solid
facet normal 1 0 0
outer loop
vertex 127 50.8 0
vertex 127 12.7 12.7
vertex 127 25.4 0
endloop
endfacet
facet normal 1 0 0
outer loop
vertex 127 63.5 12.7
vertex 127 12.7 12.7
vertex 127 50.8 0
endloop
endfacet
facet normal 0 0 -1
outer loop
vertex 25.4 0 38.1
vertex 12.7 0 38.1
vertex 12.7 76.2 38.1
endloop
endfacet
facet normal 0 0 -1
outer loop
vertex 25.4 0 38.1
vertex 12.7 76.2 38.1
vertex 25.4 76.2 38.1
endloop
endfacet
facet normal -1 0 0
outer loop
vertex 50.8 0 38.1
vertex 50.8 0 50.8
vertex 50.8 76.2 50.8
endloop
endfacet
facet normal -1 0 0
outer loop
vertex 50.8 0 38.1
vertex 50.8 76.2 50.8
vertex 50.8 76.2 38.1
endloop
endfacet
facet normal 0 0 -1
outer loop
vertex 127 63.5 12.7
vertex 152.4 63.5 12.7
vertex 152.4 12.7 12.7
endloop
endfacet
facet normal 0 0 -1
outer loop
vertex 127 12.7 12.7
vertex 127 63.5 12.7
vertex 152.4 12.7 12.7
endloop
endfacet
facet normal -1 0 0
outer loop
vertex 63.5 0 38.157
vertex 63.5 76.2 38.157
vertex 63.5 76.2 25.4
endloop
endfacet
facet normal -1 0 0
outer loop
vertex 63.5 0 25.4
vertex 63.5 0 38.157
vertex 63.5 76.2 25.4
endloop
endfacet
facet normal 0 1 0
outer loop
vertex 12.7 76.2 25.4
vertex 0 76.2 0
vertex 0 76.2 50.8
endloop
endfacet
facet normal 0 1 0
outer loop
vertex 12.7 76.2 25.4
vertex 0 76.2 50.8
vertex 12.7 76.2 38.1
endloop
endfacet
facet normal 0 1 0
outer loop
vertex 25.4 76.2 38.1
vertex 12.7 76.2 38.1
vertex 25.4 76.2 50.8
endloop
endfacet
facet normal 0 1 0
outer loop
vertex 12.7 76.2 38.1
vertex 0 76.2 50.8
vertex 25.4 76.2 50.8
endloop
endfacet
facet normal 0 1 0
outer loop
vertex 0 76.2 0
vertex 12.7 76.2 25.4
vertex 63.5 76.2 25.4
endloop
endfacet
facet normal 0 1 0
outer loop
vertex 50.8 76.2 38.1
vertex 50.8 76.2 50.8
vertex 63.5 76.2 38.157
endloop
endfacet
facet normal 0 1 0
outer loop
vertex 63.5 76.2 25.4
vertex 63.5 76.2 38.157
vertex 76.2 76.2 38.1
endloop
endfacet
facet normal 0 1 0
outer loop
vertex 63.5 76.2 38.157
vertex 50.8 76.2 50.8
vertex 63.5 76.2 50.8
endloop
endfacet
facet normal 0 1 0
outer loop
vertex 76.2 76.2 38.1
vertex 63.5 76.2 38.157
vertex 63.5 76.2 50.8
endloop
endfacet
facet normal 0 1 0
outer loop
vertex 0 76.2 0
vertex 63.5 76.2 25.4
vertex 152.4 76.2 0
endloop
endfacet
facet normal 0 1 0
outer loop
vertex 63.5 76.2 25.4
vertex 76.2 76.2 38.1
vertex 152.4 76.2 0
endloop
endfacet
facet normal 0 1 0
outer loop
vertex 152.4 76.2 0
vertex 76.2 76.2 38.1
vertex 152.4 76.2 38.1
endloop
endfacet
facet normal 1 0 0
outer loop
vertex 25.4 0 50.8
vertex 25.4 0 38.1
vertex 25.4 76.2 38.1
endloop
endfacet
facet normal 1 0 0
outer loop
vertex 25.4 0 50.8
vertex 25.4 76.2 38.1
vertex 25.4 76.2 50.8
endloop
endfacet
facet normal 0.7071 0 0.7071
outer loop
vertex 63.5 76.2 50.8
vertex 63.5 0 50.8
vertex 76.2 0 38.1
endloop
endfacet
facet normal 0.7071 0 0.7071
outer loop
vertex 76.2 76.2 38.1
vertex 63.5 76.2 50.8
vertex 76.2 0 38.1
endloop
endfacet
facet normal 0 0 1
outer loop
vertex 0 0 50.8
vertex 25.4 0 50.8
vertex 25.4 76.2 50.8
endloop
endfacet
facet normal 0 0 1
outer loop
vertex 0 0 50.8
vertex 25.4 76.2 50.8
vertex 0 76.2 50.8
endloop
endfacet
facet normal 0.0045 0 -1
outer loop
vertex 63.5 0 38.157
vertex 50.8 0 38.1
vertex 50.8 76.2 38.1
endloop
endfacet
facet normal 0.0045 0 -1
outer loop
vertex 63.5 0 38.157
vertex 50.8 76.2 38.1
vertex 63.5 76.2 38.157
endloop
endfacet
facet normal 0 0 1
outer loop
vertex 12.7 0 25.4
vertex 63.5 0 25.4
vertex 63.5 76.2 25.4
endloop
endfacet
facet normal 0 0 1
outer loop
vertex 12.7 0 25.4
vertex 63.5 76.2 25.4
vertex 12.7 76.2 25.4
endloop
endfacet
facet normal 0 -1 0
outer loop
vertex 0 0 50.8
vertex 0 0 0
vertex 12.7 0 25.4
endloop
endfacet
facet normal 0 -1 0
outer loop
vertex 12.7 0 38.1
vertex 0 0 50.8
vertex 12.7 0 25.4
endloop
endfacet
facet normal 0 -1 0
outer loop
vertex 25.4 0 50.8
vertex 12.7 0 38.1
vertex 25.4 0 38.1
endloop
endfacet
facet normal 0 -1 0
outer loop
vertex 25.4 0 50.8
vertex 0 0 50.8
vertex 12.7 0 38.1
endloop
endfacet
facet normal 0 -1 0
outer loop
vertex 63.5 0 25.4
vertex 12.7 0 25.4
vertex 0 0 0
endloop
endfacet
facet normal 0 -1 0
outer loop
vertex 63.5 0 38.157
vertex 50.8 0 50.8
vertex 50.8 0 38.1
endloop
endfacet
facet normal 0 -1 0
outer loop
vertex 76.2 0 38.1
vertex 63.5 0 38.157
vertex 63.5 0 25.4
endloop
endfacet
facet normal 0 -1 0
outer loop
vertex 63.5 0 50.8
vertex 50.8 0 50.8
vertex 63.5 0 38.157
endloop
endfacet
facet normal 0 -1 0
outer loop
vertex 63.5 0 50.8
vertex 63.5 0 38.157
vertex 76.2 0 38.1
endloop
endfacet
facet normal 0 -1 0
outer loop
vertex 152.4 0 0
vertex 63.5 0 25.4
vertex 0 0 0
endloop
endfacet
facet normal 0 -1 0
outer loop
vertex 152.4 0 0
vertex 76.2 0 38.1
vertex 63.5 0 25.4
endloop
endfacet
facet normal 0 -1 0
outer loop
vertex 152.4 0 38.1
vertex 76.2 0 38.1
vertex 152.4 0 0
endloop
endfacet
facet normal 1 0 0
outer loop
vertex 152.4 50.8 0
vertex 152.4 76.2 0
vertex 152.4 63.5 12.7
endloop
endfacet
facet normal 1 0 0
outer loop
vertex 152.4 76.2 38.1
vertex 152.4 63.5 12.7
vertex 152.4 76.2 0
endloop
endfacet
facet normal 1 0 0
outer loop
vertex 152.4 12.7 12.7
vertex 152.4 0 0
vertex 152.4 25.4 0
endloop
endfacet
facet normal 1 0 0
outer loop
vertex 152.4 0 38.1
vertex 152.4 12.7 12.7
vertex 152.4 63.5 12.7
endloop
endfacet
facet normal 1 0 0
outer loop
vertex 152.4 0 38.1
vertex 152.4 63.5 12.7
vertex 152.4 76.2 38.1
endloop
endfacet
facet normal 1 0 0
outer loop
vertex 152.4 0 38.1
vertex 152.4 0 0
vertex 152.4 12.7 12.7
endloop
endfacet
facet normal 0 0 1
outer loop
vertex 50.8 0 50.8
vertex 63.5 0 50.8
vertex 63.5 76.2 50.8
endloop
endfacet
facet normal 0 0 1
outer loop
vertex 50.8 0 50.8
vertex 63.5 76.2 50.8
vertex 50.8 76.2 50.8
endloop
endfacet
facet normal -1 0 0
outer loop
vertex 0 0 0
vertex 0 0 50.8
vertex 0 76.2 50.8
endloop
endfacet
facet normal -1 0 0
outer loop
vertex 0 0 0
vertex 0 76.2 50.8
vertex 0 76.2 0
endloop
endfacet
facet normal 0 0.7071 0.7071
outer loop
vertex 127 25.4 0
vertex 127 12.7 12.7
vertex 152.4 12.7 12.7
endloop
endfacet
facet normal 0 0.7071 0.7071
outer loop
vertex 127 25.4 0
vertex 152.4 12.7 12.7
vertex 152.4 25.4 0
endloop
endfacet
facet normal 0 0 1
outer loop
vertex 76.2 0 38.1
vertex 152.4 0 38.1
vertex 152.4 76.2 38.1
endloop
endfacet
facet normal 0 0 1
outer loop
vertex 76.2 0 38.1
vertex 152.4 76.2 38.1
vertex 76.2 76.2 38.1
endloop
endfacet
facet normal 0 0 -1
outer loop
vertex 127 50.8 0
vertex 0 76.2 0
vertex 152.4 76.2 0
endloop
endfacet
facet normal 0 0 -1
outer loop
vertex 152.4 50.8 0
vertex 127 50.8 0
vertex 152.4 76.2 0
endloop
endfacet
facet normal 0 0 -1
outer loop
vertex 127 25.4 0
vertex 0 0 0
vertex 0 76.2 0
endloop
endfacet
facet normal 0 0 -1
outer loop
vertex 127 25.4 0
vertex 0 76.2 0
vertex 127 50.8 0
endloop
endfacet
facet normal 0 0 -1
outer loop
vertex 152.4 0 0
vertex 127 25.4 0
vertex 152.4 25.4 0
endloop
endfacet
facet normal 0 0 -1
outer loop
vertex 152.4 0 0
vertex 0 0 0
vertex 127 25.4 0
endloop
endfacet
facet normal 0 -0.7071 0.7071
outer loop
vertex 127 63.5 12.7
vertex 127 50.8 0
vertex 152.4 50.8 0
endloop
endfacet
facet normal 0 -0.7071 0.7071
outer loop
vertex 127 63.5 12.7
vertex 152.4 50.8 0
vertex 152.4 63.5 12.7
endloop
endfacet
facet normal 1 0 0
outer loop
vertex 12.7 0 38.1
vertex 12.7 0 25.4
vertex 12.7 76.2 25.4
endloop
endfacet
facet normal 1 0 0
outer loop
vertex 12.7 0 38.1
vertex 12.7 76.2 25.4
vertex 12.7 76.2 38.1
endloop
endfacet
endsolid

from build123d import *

# Parameters (mm, degrees)
F1_DEPTH = 76.2
F3_DEPTH = 25.4
F5_DEPTH = 76.2


with BuildPart() as f1:
    # F0 (on Front) → F1 (new body)
    with BuildSketch(Plane.XZ):
        Polygon((0, 50.8), (0, 0), (152.4, 0), (152.4, 38.1), (76.2, 38.1), (76.2, 50.8), (50.8, 50.8), (50.8, 38.1), (63.5, 38.157292), (63.5, 25.4), (12.7, 25.4), (12.7, 38.1), (25.4, 38.1), (25.4, 50.8), align=None)
    extrude(amount=-F1_DEPTH)

    # F2 (on face) → F3 (cut)
    with BuildSketch(Plane.YZ.offset(152.4)):
        Polygon((12.7, 12.7), (25.4, 0), (50.8, 0), (63.5, 12.7), align=None)
    extrude(amount=-F3_DEPTH, mode=Mode.SUBTRACT)

    # F4 (on face) → F5 (cut)
    with BuildSketch(Plane.XZ):
        Polygon((76.2, 50.8), (63.5, 50.8), (76.2, 38.1), align=None)
    extrude(amount=-F5_DEPTH, mode=Mode.SUBTRACT)


solid = f1.part
